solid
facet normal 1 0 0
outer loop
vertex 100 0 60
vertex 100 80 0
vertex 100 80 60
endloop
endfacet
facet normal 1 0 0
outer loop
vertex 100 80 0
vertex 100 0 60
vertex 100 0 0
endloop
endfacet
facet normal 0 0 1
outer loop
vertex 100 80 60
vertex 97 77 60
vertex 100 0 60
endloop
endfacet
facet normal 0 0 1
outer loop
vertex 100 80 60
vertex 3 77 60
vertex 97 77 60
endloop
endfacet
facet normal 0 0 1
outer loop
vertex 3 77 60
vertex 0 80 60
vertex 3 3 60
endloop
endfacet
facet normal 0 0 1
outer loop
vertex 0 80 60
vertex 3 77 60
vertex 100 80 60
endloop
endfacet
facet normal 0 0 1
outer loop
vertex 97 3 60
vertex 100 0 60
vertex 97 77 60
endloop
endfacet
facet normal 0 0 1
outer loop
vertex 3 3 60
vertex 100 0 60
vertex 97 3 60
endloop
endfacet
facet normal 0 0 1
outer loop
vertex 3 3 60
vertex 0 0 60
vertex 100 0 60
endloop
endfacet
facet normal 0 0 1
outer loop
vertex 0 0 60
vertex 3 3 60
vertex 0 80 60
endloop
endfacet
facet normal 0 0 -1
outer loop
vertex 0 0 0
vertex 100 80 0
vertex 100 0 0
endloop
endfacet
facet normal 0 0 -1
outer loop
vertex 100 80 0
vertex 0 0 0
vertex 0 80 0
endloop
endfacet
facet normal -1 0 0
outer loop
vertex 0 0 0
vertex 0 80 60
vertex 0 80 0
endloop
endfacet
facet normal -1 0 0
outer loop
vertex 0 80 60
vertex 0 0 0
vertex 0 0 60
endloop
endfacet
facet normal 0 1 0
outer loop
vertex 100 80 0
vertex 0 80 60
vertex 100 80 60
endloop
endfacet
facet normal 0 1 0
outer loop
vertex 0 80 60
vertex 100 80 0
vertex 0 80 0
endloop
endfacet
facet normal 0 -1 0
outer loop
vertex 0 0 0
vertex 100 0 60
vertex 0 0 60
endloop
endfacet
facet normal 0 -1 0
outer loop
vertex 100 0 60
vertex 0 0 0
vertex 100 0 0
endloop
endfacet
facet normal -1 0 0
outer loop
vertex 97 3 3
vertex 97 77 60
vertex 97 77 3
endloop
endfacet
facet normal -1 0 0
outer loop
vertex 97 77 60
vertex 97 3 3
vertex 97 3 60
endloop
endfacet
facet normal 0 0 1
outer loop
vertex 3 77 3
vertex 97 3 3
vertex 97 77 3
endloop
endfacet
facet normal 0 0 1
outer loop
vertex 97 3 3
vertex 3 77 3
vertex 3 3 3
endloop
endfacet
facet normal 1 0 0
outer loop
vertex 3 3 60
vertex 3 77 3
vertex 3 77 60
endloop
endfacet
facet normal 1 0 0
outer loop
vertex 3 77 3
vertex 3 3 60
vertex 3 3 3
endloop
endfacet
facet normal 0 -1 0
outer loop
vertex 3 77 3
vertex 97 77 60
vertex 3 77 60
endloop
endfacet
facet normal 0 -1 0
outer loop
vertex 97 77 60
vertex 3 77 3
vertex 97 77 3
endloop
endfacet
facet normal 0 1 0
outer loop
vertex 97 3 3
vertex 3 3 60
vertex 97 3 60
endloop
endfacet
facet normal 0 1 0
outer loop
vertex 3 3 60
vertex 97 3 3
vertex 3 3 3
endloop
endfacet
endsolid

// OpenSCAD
// Parameterar för låda
box_width = 100;      // [20:1:200] Bred
box_depth = 80;       // [20:1:200] Djup
box_height = 60;      // [20:1:200] Hög
wall_thickness = 3;   // [1:0.5:10] Vägg tjocklek
bottom_thickness = 3; // [1:0.5:10] Botten tjocklek
box_color = "Wheat";  // ["Wheat","Brown","LightGray","SandyBrown"] Färg

color(box_color)
difference() {
    // Hel låda (yttre)
    cube([box_width, box_depth, box_height], center = false);

    // Skär ut insidan — lämnar botten + väggar
    translate([wall_thickness, wall_thickness, bottom_thickness])
    cube([box_width - 2 * wall_thickness,
          box_depth - 2 * wall_thickness,
          box_height - bottom_thickness],
         center = false);
}
